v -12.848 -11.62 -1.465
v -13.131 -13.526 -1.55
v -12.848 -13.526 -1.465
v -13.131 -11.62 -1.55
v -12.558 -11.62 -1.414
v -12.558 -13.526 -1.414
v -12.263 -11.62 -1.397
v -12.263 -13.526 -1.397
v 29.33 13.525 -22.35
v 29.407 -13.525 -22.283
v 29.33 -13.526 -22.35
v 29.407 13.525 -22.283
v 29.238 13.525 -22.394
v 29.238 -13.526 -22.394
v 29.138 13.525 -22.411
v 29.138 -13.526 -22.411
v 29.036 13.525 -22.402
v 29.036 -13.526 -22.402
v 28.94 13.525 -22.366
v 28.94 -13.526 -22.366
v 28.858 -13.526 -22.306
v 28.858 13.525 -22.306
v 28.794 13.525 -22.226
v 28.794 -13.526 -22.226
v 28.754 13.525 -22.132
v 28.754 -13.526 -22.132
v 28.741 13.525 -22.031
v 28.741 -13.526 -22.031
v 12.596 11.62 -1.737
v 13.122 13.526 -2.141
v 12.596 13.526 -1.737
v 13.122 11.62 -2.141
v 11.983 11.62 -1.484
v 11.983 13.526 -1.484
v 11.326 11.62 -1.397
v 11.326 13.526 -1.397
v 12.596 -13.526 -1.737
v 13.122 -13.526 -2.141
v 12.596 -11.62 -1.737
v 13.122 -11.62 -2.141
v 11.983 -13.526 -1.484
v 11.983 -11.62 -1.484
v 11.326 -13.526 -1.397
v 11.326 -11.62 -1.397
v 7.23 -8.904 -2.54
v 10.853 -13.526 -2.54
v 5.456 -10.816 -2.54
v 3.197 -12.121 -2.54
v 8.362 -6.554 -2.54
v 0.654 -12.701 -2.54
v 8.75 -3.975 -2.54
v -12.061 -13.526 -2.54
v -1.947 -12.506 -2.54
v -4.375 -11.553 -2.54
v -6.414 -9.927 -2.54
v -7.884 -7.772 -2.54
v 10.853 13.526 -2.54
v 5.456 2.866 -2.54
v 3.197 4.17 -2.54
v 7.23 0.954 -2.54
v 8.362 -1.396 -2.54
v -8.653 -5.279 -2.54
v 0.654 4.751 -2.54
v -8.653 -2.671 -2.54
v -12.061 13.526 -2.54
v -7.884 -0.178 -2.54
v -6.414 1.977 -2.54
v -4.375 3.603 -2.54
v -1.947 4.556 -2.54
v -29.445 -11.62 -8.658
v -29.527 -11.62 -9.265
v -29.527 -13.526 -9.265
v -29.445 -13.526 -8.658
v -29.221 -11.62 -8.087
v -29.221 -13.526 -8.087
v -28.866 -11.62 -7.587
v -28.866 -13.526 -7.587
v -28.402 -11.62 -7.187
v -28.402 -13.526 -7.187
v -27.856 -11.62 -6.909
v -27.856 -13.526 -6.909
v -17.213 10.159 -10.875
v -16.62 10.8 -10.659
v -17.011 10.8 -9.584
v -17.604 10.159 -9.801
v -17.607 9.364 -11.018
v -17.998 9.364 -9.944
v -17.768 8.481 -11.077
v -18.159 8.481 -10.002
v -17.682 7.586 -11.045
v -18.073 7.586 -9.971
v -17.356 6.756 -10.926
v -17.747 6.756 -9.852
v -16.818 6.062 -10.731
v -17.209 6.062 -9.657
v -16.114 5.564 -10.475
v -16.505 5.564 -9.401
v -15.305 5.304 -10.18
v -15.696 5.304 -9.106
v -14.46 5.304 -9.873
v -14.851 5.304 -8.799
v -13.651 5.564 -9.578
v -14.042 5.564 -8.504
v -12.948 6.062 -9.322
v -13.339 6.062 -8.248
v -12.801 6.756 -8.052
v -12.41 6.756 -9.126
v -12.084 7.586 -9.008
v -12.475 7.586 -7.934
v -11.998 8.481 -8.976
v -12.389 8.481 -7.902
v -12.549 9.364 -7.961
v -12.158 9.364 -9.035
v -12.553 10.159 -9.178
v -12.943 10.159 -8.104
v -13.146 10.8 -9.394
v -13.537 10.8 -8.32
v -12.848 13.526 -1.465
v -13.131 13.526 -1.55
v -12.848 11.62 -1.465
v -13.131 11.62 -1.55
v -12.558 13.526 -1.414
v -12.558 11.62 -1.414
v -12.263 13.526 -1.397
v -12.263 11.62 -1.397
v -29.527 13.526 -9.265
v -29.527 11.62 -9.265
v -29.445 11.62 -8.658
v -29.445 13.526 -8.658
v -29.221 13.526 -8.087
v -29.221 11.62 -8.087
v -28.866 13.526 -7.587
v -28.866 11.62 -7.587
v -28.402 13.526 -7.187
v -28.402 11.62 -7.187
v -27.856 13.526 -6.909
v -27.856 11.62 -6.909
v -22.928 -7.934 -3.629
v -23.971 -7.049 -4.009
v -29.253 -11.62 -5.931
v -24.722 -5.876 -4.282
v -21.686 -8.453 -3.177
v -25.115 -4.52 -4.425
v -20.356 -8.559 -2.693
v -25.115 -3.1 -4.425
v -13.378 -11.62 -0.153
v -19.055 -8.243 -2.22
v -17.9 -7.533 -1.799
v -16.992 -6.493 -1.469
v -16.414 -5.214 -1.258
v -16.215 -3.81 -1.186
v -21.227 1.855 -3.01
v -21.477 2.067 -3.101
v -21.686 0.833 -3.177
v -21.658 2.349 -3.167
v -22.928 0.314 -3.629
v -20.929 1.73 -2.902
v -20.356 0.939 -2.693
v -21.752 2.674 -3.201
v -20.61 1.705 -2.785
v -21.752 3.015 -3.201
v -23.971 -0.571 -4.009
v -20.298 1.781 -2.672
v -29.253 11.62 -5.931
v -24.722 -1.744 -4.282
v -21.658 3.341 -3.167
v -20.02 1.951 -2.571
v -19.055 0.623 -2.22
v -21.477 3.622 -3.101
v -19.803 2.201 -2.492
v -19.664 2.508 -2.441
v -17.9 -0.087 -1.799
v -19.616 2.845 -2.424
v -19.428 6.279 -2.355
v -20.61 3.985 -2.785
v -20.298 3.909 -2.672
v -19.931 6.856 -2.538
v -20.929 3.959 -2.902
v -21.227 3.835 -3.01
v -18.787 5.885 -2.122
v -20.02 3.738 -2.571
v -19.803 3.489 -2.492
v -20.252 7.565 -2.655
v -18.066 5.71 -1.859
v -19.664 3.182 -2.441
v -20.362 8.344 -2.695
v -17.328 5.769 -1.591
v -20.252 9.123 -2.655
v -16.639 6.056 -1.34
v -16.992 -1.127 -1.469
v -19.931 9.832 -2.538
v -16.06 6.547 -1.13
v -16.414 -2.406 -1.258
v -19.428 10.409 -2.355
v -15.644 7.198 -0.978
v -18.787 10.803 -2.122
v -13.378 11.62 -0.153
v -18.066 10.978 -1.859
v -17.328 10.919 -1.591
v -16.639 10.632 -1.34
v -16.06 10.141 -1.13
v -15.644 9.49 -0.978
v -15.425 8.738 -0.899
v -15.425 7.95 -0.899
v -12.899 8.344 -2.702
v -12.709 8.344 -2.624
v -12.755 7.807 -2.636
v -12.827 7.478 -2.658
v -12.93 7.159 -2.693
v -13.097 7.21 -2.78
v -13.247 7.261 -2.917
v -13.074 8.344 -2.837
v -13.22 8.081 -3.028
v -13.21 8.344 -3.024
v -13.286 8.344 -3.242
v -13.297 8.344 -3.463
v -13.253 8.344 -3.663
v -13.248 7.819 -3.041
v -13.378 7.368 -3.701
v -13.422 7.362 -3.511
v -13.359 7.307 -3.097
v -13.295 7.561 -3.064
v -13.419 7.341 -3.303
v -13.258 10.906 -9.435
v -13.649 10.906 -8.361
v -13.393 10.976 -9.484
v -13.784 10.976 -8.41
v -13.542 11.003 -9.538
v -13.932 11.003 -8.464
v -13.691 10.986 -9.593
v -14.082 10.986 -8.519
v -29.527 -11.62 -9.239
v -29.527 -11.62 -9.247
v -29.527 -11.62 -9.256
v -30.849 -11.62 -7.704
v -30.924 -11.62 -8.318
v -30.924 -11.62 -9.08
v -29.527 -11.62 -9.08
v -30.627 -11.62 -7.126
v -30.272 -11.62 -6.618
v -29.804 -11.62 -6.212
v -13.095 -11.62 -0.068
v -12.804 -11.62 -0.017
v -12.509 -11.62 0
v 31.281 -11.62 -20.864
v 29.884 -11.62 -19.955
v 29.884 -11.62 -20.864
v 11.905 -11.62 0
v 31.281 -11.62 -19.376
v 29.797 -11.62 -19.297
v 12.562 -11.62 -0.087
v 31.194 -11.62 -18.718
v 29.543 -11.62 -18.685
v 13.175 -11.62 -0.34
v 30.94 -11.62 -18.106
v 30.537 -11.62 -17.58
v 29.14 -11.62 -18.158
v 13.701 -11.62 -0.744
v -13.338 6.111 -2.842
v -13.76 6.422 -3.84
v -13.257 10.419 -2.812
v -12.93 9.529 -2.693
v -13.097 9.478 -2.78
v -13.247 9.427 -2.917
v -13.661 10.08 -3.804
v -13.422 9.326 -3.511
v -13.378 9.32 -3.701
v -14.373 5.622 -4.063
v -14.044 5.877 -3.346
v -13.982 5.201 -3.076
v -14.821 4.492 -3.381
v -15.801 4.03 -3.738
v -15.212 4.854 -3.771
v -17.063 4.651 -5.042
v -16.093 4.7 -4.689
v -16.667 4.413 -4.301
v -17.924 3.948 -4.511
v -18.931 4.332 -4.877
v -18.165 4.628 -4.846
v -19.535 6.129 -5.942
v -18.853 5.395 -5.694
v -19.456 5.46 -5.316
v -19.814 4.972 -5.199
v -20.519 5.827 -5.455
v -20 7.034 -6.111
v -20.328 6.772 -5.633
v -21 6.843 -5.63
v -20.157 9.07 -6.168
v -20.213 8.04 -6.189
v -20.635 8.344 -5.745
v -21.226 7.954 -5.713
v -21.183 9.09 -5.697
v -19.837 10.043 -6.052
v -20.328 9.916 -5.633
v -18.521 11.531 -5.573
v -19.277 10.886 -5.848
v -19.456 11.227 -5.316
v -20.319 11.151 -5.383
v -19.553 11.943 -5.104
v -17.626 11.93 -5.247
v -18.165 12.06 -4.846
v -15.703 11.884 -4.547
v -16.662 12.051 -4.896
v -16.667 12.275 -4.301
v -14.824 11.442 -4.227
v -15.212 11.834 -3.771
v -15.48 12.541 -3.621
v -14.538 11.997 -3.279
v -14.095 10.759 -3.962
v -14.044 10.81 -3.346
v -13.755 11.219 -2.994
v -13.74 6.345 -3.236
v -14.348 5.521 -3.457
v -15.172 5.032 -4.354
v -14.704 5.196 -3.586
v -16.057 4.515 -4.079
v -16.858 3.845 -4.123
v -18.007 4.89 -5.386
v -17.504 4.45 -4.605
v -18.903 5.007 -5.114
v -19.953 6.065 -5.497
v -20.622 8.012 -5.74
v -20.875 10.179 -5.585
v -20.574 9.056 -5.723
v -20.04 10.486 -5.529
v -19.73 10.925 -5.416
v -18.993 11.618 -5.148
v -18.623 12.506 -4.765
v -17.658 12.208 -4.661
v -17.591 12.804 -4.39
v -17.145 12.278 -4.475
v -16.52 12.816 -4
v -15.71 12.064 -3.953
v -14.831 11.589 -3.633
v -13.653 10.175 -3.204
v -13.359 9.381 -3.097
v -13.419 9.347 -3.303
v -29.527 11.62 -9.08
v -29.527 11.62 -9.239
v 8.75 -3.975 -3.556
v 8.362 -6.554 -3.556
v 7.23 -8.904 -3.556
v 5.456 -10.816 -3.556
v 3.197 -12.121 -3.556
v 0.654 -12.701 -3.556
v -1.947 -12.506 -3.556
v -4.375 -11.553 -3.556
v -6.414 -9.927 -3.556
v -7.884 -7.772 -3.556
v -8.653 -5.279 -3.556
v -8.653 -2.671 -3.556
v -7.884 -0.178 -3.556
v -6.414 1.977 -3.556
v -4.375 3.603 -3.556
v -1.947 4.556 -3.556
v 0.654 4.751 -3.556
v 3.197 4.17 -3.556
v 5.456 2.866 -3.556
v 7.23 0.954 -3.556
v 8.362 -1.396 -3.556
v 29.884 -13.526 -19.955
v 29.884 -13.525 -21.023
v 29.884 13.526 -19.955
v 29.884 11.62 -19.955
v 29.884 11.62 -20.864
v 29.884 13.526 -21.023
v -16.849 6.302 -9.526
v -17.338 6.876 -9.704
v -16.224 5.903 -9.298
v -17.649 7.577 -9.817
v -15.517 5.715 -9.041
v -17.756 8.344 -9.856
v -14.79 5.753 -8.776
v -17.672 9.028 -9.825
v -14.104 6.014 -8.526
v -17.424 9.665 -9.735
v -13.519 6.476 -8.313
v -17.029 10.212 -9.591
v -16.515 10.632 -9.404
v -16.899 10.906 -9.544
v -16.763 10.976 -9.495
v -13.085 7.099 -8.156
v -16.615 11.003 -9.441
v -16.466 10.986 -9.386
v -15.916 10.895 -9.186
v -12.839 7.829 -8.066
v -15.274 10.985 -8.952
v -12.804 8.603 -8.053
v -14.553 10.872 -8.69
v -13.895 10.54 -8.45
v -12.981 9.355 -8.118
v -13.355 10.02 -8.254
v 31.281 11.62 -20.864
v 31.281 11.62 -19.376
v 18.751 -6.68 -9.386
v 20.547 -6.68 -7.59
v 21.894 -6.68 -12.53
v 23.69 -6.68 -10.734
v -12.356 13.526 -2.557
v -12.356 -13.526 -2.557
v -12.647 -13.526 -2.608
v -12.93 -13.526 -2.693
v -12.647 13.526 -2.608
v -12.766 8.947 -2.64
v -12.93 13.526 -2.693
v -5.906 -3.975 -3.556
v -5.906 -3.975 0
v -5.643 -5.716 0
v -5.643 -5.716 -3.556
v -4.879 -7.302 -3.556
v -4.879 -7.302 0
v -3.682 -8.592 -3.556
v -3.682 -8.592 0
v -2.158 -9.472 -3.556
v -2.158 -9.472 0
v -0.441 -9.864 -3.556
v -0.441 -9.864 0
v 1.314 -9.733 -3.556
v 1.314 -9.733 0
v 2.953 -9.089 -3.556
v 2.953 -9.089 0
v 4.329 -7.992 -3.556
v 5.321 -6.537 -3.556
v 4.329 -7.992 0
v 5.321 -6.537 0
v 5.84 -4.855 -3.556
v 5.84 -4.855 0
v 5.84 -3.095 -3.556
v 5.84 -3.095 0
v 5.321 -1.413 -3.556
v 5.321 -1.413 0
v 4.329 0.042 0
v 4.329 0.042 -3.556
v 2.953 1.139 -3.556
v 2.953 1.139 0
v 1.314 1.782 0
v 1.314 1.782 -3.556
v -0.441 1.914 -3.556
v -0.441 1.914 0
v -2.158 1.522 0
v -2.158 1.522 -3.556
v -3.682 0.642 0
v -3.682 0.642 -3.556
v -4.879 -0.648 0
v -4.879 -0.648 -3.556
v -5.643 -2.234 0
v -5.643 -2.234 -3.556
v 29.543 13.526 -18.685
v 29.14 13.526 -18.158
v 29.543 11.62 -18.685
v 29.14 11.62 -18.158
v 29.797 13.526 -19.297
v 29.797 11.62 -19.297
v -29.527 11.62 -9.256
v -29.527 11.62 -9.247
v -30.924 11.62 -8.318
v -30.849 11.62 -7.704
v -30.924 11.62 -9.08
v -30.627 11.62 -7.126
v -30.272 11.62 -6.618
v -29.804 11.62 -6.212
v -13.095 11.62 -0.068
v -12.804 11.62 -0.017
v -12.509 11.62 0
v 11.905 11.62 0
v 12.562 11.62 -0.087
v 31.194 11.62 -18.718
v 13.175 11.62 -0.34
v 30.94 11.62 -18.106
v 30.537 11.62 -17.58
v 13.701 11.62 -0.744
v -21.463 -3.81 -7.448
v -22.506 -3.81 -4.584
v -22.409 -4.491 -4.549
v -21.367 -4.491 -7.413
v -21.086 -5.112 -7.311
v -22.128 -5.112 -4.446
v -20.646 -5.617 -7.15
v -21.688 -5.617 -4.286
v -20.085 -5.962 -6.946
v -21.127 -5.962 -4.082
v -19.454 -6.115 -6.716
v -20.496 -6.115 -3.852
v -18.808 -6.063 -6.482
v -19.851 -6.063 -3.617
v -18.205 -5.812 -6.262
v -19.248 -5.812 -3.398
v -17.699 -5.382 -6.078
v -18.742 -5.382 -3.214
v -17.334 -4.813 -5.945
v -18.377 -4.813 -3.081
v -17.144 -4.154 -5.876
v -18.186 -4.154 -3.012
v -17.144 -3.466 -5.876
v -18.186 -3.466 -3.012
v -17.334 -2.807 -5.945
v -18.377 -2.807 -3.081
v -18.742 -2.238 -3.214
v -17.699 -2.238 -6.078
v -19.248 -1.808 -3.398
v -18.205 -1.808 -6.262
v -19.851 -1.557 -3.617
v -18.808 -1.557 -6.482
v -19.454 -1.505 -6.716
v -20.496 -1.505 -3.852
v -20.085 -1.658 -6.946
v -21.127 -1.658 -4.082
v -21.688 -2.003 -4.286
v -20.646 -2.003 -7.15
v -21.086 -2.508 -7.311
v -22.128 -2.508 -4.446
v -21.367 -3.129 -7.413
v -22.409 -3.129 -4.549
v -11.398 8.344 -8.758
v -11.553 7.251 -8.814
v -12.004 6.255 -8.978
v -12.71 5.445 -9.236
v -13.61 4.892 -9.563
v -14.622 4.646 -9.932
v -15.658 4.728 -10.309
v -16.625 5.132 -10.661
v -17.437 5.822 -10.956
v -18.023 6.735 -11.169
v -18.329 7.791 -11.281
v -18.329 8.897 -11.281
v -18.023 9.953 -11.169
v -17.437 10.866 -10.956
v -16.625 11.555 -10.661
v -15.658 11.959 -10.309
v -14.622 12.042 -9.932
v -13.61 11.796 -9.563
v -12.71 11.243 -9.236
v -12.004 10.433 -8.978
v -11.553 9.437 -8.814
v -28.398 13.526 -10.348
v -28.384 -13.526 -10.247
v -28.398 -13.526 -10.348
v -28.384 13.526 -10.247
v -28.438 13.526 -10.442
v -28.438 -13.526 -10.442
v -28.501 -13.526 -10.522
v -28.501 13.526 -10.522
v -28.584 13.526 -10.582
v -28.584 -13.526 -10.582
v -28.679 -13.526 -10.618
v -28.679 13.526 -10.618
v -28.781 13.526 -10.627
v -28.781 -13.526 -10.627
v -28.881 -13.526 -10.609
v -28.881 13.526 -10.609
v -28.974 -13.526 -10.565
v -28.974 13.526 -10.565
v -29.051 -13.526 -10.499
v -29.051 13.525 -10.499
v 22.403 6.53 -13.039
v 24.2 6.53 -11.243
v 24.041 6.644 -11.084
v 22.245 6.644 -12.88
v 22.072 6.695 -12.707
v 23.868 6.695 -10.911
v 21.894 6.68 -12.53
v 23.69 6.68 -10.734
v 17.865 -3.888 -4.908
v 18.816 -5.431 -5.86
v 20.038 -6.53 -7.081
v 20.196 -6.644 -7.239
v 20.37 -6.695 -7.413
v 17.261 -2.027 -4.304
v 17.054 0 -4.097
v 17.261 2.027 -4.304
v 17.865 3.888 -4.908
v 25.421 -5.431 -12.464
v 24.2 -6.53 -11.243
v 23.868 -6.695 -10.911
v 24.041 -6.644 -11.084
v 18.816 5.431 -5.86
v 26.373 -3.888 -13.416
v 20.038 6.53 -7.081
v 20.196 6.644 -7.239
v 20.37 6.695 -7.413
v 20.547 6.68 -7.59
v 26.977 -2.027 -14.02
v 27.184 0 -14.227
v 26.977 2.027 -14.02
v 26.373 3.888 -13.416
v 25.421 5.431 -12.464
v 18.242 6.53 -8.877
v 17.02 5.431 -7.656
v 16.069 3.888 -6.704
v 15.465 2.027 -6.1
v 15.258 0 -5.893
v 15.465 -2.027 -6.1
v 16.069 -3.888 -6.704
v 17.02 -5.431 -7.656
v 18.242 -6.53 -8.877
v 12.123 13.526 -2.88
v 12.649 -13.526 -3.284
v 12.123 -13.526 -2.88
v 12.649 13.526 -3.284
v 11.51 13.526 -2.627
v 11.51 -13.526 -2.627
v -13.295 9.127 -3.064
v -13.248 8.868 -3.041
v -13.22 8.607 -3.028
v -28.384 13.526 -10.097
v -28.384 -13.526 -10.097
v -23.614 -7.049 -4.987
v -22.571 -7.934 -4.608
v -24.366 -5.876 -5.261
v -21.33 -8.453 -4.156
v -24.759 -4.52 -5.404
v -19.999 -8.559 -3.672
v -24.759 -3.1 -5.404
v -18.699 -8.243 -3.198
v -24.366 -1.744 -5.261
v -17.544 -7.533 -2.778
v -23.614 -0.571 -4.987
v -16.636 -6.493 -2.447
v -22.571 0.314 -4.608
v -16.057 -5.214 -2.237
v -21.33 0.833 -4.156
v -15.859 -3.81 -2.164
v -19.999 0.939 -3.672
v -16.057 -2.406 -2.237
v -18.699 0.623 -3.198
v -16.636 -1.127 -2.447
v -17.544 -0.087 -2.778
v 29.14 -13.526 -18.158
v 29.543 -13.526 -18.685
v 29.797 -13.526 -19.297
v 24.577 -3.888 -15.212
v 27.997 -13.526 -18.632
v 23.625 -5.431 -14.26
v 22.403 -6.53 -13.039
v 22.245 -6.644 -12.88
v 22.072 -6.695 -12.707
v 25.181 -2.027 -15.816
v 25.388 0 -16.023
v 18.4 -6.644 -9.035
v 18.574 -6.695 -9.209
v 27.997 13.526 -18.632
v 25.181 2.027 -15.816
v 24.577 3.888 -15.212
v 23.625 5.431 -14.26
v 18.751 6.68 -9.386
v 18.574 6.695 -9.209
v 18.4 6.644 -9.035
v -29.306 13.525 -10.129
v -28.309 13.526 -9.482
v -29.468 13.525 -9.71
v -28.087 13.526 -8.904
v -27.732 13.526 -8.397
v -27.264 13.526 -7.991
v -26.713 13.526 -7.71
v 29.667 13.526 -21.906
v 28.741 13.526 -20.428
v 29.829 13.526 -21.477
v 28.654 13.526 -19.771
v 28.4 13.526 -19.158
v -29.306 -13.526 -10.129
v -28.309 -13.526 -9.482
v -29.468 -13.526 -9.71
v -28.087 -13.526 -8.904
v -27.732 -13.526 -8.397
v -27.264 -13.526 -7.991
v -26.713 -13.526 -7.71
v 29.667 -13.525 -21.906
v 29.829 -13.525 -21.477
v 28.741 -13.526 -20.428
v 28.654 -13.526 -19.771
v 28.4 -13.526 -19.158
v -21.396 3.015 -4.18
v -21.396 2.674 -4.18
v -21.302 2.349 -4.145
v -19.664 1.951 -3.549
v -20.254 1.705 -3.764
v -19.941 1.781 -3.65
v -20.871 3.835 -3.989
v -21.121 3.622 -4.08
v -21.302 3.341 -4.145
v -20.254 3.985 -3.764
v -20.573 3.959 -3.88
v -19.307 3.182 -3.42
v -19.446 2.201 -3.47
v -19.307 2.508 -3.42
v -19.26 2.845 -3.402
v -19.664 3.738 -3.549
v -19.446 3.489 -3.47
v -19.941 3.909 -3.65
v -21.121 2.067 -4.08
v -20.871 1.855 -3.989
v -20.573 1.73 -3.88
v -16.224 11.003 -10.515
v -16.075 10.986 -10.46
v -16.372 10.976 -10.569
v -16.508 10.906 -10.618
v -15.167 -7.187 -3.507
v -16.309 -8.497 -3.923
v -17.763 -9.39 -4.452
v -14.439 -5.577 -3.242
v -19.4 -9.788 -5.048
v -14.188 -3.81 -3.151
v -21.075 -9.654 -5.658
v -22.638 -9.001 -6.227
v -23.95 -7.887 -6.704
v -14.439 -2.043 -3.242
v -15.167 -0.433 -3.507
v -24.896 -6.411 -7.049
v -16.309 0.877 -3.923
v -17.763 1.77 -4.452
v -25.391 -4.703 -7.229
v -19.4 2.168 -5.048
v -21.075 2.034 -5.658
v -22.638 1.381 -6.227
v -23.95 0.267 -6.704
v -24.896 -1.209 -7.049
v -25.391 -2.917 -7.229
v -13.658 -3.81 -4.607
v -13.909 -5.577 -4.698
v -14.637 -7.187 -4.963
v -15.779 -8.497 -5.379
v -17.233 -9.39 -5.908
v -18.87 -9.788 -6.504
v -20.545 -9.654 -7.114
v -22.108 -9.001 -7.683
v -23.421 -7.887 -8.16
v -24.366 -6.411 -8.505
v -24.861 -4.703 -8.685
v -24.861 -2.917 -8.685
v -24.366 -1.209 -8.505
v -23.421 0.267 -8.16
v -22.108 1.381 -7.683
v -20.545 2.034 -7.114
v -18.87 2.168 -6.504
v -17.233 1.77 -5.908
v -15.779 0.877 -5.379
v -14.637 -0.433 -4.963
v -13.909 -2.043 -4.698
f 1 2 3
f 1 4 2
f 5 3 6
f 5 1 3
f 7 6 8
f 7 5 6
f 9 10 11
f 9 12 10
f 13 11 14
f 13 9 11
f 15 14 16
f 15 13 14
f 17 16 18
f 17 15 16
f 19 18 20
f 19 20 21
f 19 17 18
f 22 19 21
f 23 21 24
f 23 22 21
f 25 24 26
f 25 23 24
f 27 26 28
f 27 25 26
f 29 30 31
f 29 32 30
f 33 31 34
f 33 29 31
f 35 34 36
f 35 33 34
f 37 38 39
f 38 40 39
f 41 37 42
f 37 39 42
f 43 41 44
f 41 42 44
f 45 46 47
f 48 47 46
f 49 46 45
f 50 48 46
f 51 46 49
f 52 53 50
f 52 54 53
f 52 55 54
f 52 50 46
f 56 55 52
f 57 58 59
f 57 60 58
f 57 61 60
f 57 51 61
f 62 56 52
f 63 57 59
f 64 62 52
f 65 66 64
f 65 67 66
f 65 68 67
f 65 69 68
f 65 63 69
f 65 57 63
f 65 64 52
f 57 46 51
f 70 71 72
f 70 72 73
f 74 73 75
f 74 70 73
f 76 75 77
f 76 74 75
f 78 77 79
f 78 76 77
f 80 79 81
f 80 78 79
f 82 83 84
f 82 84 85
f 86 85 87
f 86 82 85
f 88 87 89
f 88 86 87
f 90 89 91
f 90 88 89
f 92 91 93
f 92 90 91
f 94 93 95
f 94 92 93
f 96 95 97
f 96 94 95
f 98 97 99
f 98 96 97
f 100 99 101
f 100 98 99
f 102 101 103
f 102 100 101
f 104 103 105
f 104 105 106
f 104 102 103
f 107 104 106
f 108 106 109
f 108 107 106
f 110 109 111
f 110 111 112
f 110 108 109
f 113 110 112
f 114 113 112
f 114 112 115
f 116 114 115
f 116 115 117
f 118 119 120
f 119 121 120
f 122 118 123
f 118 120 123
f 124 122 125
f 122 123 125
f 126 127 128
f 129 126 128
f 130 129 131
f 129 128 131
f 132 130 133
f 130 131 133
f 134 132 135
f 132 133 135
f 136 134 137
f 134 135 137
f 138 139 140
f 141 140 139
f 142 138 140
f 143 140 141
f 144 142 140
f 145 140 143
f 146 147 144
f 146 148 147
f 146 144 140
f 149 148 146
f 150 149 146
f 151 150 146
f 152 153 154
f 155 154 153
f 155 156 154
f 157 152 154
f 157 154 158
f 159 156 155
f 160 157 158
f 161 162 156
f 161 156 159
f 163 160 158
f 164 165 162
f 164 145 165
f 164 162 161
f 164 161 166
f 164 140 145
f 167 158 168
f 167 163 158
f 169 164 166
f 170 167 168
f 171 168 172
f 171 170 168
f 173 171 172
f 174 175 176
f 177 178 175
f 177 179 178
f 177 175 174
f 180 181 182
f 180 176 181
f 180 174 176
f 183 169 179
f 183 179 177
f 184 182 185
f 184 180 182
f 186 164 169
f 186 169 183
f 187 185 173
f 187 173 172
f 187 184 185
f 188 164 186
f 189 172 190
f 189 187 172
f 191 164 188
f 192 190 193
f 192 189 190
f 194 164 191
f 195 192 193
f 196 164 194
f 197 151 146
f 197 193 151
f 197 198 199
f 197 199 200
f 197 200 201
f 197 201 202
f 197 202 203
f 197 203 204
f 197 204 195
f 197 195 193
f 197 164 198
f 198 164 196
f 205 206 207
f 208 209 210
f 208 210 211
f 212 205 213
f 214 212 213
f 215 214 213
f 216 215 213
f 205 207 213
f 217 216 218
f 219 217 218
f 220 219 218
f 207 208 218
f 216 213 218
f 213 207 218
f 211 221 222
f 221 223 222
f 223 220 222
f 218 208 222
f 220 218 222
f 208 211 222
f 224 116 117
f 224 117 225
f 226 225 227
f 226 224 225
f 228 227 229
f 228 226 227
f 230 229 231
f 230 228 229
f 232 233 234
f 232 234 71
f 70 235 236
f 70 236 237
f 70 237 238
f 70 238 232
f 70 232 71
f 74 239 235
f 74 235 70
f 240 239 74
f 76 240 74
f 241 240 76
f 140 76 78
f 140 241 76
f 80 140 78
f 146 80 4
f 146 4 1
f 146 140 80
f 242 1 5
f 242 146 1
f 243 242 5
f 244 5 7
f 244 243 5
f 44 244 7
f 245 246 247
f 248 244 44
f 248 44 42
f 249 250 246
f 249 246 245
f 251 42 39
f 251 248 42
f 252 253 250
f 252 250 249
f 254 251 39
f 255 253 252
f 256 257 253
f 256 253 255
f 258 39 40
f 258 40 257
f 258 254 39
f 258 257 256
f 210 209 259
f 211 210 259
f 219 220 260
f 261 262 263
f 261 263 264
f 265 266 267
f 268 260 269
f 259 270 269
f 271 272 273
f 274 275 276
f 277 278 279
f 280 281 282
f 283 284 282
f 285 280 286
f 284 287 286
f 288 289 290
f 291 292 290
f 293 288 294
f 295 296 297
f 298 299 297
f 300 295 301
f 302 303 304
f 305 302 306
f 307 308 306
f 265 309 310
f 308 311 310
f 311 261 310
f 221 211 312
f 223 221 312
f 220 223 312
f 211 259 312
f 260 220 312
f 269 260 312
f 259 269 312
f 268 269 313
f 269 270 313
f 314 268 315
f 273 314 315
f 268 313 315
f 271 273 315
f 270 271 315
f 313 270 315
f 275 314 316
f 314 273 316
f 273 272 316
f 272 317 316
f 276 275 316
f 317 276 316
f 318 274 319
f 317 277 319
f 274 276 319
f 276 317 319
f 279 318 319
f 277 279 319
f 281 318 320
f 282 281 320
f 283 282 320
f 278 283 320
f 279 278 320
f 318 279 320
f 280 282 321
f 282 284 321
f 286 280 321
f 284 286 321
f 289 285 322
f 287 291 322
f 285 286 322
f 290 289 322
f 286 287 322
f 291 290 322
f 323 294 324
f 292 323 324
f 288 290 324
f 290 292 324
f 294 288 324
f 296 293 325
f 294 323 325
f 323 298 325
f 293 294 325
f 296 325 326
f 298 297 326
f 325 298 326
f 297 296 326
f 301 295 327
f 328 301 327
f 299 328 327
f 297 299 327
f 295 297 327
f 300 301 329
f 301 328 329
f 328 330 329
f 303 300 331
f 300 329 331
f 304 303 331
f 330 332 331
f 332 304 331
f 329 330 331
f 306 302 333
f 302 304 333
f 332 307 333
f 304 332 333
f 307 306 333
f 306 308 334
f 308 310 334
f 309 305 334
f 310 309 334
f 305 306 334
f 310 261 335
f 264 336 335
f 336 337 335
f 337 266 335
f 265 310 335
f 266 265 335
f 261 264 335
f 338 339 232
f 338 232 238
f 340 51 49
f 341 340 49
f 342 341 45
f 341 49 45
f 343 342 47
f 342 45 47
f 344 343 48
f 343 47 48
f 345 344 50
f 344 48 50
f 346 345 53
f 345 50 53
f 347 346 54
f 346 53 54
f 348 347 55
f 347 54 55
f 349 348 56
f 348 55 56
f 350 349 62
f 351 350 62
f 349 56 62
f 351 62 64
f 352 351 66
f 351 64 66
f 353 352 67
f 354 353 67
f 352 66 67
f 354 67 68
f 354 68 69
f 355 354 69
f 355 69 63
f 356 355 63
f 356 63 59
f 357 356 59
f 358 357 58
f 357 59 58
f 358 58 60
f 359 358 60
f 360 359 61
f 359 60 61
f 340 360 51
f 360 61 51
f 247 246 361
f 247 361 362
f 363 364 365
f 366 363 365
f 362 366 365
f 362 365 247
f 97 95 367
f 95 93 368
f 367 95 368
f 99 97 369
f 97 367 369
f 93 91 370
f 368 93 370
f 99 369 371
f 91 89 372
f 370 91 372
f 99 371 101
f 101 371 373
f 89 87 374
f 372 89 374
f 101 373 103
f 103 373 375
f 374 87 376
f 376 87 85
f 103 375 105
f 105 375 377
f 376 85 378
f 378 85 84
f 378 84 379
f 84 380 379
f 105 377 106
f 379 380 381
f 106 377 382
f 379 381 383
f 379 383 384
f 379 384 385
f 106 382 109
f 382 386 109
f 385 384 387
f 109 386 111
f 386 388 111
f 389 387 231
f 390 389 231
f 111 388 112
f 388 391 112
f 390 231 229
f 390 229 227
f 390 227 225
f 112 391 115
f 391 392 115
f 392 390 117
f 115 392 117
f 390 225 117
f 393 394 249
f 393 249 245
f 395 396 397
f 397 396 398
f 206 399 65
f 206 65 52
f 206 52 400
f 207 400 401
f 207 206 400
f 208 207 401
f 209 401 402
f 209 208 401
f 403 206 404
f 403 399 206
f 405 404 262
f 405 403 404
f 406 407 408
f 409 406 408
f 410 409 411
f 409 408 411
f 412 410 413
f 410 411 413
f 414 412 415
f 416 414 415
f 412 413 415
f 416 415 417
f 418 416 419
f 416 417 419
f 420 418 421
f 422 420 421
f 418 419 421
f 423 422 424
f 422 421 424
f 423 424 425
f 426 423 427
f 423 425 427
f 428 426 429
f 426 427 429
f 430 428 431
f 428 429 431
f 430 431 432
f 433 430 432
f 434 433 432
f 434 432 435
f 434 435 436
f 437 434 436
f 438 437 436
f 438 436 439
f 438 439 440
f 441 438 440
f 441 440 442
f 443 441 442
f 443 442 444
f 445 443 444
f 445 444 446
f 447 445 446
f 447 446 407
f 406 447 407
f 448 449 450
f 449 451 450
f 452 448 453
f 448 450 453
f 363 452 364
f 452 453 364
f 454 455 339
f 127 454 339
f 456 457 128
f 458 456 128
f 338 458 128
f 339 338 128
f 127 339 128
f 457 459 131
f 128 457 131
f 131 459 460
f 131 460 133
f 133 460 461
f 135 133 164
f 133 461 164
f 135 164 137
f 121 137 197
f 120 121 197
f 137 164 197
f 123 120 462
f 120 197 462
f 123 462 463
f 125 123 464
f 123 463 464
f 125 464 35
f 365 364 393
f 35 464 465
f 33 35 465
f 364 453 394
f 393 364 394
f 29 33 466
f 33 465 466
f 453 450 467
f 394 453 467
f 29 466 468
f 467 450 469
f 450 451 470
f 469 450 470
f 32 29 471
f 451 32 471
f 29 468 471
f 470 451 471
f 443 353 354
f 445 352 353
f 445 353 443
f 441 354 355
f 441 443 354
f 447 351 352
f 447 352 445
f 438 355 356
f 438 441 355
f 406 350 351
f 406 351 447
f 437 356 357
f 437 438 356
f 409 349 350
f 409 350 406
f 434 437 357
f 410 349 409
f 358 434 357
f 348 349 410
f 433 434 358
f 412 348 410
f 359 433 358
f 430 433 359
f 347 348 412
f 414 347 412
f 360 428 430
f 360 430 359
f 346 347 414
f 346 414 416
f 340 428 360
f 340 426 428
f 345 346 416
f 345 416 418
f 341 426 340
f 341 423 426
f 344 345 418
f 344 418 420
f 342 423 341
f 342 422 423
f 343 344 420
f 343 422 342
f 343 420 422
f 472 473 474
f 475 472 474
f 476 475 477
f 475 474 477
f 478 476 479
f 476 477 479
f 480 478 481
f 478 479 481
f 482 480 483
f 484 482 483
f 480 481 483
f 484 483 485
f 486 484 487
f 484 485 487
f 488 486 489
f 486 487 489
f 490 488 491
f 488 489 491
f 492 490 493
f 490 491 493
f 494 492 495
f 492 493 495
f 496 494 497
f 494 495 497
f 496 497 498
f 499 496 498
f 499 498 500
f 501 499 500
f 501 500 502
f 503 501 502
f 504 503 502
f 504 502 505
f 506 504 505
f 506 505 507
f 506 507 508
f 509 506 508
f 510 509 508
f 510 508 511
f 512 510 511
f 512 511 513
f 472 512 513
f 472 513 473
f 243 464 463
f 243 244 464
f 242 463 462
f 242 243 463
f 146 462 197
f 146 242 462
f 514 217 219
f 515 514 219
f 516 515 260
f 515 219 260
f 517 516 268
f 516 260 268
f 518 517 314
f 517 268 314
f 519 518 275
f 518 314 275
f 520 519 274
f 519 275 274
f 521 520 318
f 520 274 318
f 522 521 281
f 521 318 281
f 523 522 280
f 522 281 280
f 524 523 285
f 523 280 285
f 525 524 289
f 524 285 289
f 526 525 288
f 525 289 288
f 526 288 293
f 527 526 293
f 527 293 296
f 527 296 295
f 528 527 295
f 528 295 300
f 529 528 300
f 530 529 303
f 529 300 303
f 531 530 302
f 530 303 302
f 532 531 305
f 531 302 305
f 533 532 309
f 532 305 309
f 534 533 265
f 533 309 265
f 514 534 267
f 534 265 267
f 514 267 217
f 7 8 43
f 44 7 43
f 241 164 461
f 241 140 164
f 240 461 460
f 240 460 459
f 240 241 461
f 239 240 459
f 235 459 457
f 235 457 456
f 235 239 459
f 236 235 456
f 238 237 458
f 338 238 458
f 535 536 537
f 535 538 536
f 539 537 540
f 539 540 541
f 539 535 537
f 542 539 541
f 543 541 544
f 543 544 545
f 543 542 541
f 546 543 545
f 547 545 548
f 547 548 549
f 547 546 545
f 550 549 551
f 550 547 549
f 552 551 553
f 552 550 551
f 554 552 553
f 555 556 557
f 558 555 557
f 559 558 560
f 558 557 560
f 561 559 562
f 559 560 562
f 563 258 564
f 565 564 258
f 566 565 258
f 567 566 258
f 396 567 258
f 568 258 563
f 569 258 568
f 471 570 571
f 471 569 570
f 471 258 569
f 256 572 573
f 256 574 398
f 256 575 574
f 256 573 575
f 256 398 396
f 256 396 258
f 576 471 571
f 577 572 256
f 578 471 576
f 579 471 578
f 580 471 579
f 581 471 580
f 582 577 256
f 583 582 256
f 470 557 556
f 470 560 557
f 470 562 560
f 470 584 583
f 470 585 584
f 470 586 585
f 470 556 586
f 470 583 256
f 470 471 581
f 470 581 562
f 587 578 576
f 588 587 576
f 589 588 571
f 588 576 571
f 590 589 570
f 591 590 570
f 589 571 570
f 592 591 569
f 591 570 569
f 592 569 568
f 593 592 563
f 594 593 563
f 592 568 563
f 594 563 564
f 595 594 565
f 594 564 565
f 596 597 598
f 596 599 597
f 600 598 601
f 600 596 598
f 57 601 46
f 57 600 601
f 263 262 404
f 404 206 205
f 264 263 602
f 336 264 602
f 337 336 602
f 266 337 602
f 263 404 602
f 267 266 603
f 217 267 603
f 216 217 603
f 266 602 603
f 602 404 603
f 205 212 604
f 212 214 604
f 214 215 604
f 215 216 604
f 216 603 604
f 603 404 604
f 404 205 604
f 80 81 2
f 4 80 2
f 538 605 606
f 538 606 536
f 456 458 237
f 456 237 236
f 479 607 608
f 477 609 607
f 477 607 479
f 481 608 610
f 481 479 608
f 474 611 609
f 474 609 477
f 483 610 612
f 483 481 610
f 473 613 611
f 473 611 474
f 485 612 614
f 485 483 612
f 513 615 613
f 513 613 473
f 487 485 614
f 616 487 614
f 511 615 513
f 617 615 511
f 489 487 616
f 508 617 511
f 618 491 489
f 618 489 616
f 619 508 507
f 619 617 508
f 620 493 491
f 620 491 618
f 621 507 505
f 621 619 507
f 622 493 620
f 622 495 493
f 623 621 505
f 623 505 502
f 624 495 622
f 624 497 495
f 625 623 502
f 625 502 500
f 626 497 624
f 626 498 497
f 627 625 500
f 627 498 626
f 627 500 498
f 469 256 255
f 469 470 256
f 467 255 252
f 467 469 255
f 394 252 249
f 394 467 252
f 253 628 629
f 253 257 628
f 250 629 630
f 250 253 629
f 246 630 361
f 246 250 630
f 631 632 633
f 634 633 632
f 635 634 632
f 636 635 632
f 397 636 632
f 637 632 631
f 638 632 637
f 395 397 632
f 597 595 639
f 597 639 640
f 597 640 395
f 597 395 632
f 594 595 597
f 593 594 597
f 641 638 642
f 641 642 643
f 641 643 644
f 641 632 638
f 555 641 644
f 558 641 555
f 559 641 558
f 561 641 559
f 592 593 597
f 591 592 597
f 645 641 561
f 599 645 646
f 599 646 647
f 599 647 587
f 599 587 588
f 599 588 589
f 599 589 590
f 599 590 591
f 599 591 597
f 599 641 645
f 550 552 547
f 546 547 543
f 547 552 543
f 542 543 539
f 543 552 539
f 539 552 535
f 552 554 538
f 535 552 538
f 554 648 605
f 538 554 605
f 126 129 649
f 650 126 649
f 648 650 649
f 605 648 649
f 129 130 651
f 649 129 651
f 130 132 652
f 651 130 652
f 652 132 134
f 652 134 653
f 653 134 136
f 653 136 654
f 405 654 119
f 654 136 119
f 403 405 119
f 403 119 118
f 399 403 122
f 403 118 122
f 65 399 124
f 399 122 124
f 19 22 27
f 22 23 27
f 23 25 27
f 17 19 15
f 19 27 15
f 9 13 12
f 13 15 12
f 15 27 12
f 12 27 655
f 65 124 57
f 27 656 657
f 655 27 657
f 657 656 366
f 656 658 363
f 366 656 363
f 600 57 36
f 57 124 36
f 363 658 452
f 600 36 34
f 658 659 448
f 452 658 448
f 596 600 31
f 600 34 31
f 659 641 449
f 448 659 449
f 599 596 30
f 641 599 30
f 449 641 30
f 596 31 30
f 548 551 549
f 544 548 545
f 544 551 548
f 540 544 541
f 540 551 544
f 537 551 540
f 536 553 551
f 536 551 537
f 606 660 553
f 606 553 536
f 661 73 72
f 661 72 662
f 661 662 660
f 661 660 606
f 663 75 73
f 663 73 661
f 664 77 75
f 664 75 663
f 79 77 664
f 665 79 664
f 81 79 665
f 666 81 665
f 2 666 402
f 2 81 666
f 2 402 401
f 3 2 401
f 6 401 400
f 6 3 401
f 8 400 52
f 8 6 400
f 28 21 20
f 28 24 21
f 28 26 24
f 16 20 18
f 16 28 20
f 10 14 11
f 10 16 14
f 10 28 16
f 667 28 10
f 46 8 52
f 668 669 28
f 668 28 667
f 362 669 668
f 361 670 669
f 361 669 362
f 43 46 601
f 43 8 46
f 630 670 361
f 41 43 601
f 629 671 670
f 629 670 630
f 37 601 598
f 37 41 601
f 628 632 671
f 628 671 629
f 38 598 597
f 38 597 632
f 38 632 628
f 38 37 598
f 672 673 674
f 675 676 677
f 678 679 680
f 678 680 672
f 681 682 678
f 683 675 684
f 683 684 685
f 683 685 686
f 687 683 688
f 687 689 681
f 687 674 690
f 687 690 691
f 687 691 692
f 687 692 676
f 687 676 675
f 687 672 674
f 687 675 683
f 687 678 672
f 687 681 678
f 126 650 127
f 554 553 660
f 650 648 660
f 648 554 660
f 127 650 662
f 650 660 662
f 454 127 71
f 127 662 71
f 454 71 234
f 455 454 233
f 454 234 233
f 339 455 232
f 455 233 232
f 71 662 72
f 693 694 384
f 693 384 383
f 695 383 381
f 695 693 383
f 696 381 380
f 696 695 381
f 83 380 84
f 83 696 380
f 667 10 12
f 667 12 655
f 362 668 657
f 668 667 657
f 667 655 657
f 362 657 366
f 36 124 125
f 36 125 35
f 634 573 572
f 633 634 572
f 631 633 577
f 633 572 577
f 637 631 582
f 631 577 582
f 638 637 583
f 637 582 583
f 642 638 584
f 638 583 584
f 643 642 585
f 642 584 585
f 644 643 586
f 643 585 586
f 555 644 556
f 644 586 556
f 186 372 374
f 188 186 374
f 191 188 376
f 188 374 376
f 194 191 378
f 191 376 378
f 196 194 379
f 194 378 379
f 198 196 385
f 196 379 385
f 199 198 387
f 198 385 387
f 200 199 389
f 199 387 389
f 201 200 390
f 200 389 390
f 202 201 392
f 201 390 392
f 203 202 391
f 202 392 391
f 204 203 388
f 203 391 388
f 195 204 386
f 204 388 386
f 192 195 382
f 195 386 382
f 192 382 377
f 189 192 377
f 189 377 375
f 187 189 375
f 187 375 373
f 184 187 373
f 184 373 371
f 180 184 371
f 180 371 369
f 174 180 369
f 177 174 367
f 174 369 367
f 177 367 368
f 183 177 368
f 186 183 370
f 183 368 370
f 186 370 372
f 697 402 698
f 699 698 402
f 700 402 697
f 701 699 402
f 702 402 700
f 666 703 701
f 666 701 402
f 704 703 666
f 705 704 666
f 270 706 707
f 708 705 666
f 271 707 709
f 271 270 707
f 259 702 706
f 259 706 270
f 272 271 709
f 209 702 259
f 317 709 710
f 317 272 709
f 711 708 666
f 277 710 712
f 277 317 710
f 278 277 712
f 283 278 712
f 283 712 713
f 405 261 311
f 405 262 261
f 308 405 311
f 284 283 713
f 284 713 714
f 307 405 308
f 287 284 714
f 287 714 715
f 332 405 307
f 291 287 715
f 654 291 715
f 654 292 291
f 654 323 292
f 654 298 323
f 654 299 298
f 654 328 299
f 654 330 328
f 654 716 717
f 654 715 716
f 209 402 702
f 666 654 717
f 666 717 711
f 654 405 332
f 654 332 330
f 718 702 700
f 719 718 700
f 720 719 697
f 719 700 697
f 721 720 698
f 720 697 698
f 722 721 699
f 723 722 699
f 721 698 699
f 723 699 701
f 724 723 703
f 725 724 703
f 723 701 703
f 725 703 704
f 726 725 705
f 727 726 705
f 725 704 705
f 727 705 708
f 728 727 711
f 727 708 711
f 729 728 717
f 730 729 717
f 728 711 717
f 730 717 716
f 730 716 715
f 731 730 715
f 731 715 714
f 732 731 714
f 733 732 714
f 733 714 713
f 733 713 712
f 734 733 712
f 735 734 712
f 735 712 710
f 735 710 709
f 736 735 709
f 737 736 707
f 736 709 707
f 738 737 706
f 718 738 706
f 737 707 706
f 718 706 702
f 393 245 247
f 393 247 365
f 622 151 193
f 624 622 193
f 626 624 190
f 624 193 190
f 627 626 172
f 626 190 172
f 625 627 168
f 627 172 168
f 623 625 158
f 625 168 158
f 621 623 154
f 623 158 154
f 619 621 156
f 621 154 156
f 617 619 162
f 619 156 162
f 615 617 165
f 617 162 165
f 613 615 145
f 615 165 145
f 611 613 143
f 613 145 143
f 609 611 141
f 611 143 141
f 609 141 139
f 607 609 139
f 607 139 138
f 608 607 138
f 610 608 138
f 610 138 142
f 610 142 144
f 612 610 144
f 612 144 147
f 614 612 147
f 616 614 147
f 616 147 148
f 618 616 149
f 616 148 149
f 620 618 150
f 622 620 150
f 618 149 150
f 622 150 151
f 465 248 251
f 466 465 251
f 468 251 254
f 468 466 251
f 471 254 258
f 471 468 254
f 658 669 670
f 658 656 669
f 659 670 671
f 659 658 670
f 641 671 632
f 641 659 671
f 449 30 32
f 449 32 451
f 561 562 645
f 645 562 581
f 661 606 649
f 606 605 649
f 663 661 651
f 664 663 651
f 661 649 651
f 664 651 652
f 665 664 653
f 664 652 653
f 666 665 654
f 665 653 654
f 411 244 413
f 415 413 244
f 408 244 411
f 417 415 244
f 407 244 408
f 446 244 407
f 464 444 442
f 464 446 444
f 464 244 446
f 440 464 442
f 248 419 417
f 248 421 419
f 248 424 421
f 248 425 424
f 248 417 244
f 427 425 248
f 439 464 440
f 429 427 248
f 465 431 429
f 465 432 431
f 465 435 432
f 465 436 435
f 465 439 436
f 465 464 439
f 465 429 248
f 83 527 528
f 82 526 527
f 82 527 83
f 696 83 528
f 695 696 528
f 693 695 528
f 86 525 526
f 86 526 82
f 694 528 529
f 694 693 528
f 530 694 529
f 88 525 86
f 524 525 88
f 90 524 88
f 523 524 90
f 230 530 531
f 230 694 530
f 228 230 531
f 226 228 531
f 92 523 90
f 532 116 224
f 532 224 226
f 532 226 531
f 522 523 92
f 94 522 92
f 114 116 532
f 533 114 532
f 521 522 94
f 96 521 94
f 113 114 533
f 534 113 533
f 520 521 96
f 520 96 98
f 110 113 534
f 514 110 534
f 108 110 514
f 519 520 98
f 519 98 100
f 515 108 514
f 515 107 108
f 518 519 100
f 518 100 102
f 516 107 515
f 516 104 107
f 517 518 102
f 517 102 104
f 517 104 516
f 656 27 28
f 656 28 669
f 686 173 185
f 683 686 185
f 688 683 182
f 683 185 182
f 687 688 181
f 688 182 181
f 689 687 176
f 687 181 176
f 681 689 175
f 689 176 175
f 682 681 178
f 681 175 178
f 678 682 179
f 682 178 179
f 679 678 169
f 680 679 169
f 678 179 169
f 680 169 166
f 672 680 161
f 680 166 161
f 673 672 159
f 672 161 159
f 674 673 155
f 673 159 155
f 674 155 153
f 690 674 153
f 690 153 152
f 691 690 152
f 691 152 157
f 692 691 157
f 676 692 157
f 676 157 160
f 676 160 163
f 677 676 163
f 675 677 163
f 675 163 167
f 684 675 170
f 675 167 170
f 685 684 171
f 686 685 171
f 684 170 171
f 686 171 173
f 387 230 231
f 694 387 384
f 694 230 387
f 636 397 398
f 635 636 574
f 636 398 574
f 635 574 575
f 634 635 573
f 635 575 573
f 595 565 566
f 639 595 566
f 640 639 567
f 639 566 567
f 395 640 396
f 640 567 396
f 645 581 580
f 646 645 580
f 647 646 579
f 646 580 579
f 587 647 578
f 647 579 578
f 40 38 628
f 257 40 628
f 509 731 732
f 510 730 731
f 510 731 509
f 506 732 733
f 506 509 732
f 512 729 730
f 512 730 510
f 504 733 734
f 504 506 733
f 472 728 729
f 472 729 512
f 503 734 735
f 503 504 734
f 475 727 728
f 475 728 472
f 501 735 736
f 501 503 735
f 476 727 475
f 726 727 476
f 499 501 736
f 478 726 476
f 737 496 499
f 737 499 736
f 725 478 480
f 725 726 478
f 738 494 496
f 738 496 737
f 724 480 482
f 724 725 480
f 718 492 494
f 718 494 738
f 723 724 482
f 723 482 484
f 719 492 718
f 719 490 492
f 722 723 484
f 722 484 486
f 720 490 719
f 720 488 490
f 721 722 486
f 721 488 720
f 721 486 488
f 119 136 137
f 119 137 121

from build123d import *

# Parameters (mm, degrees)
BOSS_EXTRUDE1_DEPTH     = 13.6525
CUT_EXTRUDE1_DEPTH      = 2.032
CUT_EXTRUDE9_DEPTH      = 0.127
FILLET3_R               = 2.54
FILLET4_R               = 2.54
SKETCH5_W               = 1.905
SKETCH5_H               = 23.241
CUT_EXTRUDE4_DEPTH      = 1.397
SKETCH6_W               = 1.905
SKETCH6_H               = 23.241
CUT_EXTRUDE5_DEPTH      = 1.397
SKETCH32_R              = 5.9944
BOSS_EXTRUDE4_DEPTH     = 1.5494
F_12_28_TAPPED_HOLE1_D  = 4.6228
SKETCH33_R              = 4.7625
SKETCH33_R_2            = 1.143
CUT_EXTRUDE16_DEPTH     = 1.0414
SKETCH34_R              = 8.7503
BOSS_EXTRUDE5_DEPTH     = 1.016
F_1_2_28_TAPPED_HOLE2_D = 11.811
CUT_EXTRUDE10_DEPTH     = 50.368791583
SKETCH27_R              = 3.7084
BOSS_EXTRUDE3_DEPTH     = 6.223
CUT_EXTRUDE13_DEPTH     = 1.143
SKETCH31_R              = 2.6416
CUT_EXTRUDE15_DEPTH     = 40.985274843
FILLET5_R               = 0.79375
FILLET6_R               = 1.905
FILLET7_R               = 0.381


with BuildPart() as part:
    # Sketch1 → Boss-Extrude1 (new, symmetric)
    with BuildSketch(Plane(origin=(0, 0, 0), x_dir=(1, 0, 0), z_dir=(0, 1, 0))):
        Polygon((-12.956855136, 0), (12.956855136, 0), (31.280615395, 18.323760259), (31.280615395, 22.768760259), (28.740615395, 22.768760259), (28.740615395, 19.375862707), (11.904752688, 2.54), (-12.508984605, 2.54), (-28.383984605, 8.318027469), (-28.383984605, 10.984500322), (-30.923984605, 10.984500322), (-30.923984605, 6.539500322), align=None)
    extrude(amount=BOSS_EXTRUDE1_DEPTH, both=True)

    # Sketch2 → Cut-Extrude1 (cut)
    with BuildSketch(Plane.XZ.offset(13.6525)):
        Polygon((12.378198789, -1.397), (29.883615395, -18.902416606), (29.883615395, -22.768760259), (31.280615395, -22.768760259), (31.280615395, -18.323760259), (12.956855136, 0), (-12.956855136, 0), (-30.923984605, -6.539500322), (-30.923984605, -10.984500322), (-29.526984605, -10.984500322), (-29.526984605, -7.517690253), (-12.710526344, -1.397), align=None)
    cut_extrude1 = extrude(amount=-CUT_EXTRUDE1_DEPTH, mode=Mode.SUBTRACT)

    # Sketch17 → Cut-Extrude9 (cut)
    with BuildSketch(Plane.XZ.offset(13.6525)):
        Polygon((28.740615395, -22.768760259), (29.883615395, -22.768760259), (29.883615395, -18.902416606), (12.378198789, -1.397), (-12.710526344, -1.397), (-29.526984605, -7.517690253), (-29.526984605, -10.984500322), (-28.383984605, -10.984500322), (-28.383984605, -8.318027469), (-12.508984605, -2.54), (11.904752688, -2.54), (28.740615395, -19.375862707), align=None)
    cut_extrude9 = extrude(amount=-CUT_EXTRUDE9_DEPTH, mode=Mode.SUBTRACT)

    # Mirror1: Cut-Extrude1, Cut-Extrude9 across plane
    add(cut_extrude1.mirror(Plane.ZX), mode=Mode.SUBTRACT)
    add(cut_extrude9.mirror(Plane.ZX), mode=Mode.SUBTRACT)

    # Fillet3
    fillet3_edges = [part.edges().sort_by_distance(p)[0] for p in [
        (-30.923984605, 0, -6.539500322),
        (31.280615395, 0, -18.323760259),
        (12.956855136, 0, 0),
        (-12.956855136, 0, 0),
        (-29.526984605, 12.573, -7.517690253),
        (-12.710526344, 12.573, -1.397),
        (12.378198789, 12.573, -1.397),
        (29.883615395, 12.573, -18.902416606),
        (29.883615395, -12.573, -18.902416606),
        (12.378198789, -12.573, -1.397),
        (-12.710526344, -12.573, -1.397),
        (-29.526984605, -12.573, -7.517690253),
    ]]
    fillet(fillet3_edges, radius=FILLET3_R)

    # Fillet4
    fillet4_edges = [part.edges().sort_by_distance(p)[0] for p in [
        (-28.383984605, 0, -8.318027469),
        (-12.508984605, 0, -2.54),
        (11.904752688, 0, -2.54),
        (28.740615395, 0, -19.375862707),
    ]]
    fillet(fillet4_edges, radius=FILLET4_R)

    # Sketch5 → Cut-Extrude4 (cut)
    with BuildSketch(Plane(origin=(31.280615395, 0, 0), x_dir=(0, 0, -1), z_dir=(1, 0, 0))):
        with Locations((21.816260259, 0)):
            Rectangle(SKETCH5_W, SKETCH5_H)
    extrude(amount=-CUT_EXTRUDE4_DEPTH, mode=Mode.SUBTRACT)

    # Sketch6 → Cut-Extrude5 (cut)
    with BuildSketch(Plane.ZY.offset(30.923984605)):
        with Locations((-10.032000322, 0)):
            Rectangle(SKETCH6_W, SKETCH6_H)
    extrude(amount=-CUT_EXTRUDE5_DEPTH, mode=Mode.SUBTRACT)

    # Sketch32 → Boss-Extrude4 (add)
    with BuildSketch(Plane(origin=(-0.646932965, 0, 1.777433714), x_dir=(-0.9396926207859079, 0, -0.3420201433256701), z_dir=(0.3420201433256701, 0, -0.9396926207859079))):
        with Locations(Location((20.404914452, -3.81, 0), (0, 0, 180))):
            Circle(SKETCH32_R)
    extrude(amount=BOSS_EXTRUDE4_DEPTH)

    # #12-28 Tapped Hole1 (through all)
    with Locations(Plane(origin=(-0.117006955, 0, 0.321473968), x_dir=(0.9396926207859079, 0, 0.3420201433256701), z_dir=(0.3420201433256701, 0, -0.9396926207859079))):
        with Locations((-20.404914452, 3.81)):
            Hole(F_12_28_TAPPED_HOLE1_D / 2)

    # Sketch33 → Cut-Extrude16 (cut)
    with BuildSketch(Plane(origin=(-1.515664129, 0, 4.164252971), x_dir=(0.9396926207859079, 0, 0.34202014332567005), z_dir=(-0.34202014332567005, 0, 0.9396926207859079))):
        with Locations((-20.404914452, -3.81)):
            Circle(SKETCH33_R)
        with Locations((-20.404914452, 2.8448)):
            Circle(SKETCH33_R_2)
    extrude(amount=-CUT_EXTRUDE16_DEPTH, mode=Mode.SUBTRACT)

    # Sketch34 → Boss-Extrude5 (add)
    with BuildSketch(Plane(origin=(0, 0, -2.54), x_dir=(-1, 0, 0), z_dir=(0, 0, -1))):
        with Locations(Location((0, -3.9751, 0), (0, 0, 180))):
            Circle(SKETCH34_R)
    extrude(amount=BOSS_EXTRUDE5_DEPTH)

    # 1/2-28 Tapped Hole2 (through all)
    with Locations(Plane(origin=(0, 0, -3.556), x_dir=(1, 0, 0), z_dir=(0, 0, -1))):
        with Locations((0, 3.9751)):
            Hole(F_1_2_28_TAPPED_HOLE2_D / 2)

    # Sketch22 → Cut-Extrude10 (cut, through all)
    with BuildSketch(Plane(origin=(6.478427568, 0, 6.478427568), x_dir=(0.7071067811865479, 0, -0.7071067811865472), z_dir=(0.7071067811865472, 0, 0.7071067811865479))):
        with BuildLine():
            Line((24.341545605, 6.6802), (19.895924926, 6.6802))
            ThreePointArc((19.895924926, 6.6802), (19.52095099, 6.677571434), (19.176049558, 6.53041382))
            ThreePointArc((19.176049558, 6.53041382), (14.955935265, 0), (19.176049558, -6.53041382))
            ThreePointArc((19.176049558, -6.53041382), (19.52095099, -6.677571434), (19.895924926, -6.6802))
            Line((19.895924926, -6.6802), (24.341545605, -6.6802))
            ThreePointArc((24.341545605, -6.6802), (24.716519541, -6.677571434), (25.061420973, -6.53041382))
            ThreePointArc((25.061420973, -6.53041382), (29.281535265, 0), (25.061420973, 6.53041382))
            ThreePointArc((25.061420973, 6.53041382), (24.716519541, 6.677571434), (24.341545605, 6.6802))
        make_face()
    extrude(amount=-CUT_EXTRUDE10_DEPTH, mode=Mode.SUBTRACT)

    # Sketch27 → Boss-Extrude3 (add)
    with BuildSketch(Plane(origin=(-0.646932965, 0, 1.777433714), x_dir=(-0.9396926207859079, 0, -0.3420201433256701), z_dir=(0.3420201433256701, 0, -0.9396926207859079))):
        with Locations(Location((17.414602222, 8.3439, 0), (0, 0, 180))):
            Circle(SKETCH27_R)
    extrude(amount=BOSS_EXTRUDE3_DEPTH)

    # Sketch30 → Cut-Extrude13 (cut)
    with BuildSketch(Plane(origin=(1.481458387, 0, -4.070273465), x_dir=(-0.9396926207859079, 0, -0.34202014332567005), z_dir=(0.34202014332567005, 0, -0.9396926207859079))):
        with BuildLine():
            Line((16.146138227, 10.9855), (18.683066217, 10.9855))
            ThreePointArc((18.683066217, 10.9855), (18.999757633, 10.976126048), (19.2627898, 10.799503844))
            ThreePointArc((19.2627898, 10.799503844), (17.414602222, 5.2705), (15.566414644, 10.799503844))
            ThreePointArc((15.566414644, 10.799503844), (15.829446811, 10.976126048), (16.146138227, 10.9855))
        make_face()
    extrude(amount=-CUT_EXTRUDE13_DEPTH, mode=Mode.SUBTRACT)

    # Sketch31 → Cut-Extrude15 (cut, through all)
    with BuildSketch(Plane(origin=(1.090529363, 0, -2.996204799), x_dir=(-0.9396926207859079, 0, -0.34202014332567005), z_dir=(0.34202014332567005, 0, -0.9396926207859079))):
        with Locations((17.414602222, 8.3439)):
            Circle(SKETCH31_R)
    extrude(amount=-CUT_EXTRUDE15_DEPTH, mode=Mode.SUBTRACT)

    # Fillet5
    fillet5_edges = [part.edges().sort_by_distance(p)[0] for p in [
        (-20.496062282, 8.3439, -5.447058533),
    ]]
    fillet(fillet5_edges, radius=FILLET5_R)

    # Fillet6
    # the kernel refuses this fillet: 1.905 mm, written as the material it takes off along each edge
    with BuildSketch(Plane(origin=(29.883615395, 17.890403349, -22.768760259), x_dir=(-1.0, 0, 7.382060356189012e-12), z_dir=(0, -1, 0)), Plane(origin=(-29.526984605, -17.890403349, -10.984500322), x_dir=(1.0, 0, 7.405372125734756e-12), z_dir=(0, 1, 0))) as fillet6_piece_1:
        with BuildLine():
            CenterArc((1.905, -1.74596134), FILLET6_R, 113.578178479, 66.421821522)
            Line((0, -1.74596134), (-0.0381, -1.74596134))
            Line((-0.0381, -1.74596134), (-0.0381, 0))
            Line((-0.0381, 0), (0, 0.0381))
            ThreePointArc((0, 0.0381), (0.5715, 0.0381), (1.12776, 0.034919227))
            Line((1.12776, 0.034919227), (1.143, 0))
        make_face()
    extrude(amount=35.780806699, mode=Mode.SUBTRACT)

    # Fillet7
    fillet7_edges = [part.edges().sort_by_distance(p)[0] for p in [
        (-28.383984605, 0, -10.984500322),
        (28.740615395, 0, -22.768760259),
    ]]
    fillet(fillet7_edges, radius=FILLET7_R)


solid = part.part
